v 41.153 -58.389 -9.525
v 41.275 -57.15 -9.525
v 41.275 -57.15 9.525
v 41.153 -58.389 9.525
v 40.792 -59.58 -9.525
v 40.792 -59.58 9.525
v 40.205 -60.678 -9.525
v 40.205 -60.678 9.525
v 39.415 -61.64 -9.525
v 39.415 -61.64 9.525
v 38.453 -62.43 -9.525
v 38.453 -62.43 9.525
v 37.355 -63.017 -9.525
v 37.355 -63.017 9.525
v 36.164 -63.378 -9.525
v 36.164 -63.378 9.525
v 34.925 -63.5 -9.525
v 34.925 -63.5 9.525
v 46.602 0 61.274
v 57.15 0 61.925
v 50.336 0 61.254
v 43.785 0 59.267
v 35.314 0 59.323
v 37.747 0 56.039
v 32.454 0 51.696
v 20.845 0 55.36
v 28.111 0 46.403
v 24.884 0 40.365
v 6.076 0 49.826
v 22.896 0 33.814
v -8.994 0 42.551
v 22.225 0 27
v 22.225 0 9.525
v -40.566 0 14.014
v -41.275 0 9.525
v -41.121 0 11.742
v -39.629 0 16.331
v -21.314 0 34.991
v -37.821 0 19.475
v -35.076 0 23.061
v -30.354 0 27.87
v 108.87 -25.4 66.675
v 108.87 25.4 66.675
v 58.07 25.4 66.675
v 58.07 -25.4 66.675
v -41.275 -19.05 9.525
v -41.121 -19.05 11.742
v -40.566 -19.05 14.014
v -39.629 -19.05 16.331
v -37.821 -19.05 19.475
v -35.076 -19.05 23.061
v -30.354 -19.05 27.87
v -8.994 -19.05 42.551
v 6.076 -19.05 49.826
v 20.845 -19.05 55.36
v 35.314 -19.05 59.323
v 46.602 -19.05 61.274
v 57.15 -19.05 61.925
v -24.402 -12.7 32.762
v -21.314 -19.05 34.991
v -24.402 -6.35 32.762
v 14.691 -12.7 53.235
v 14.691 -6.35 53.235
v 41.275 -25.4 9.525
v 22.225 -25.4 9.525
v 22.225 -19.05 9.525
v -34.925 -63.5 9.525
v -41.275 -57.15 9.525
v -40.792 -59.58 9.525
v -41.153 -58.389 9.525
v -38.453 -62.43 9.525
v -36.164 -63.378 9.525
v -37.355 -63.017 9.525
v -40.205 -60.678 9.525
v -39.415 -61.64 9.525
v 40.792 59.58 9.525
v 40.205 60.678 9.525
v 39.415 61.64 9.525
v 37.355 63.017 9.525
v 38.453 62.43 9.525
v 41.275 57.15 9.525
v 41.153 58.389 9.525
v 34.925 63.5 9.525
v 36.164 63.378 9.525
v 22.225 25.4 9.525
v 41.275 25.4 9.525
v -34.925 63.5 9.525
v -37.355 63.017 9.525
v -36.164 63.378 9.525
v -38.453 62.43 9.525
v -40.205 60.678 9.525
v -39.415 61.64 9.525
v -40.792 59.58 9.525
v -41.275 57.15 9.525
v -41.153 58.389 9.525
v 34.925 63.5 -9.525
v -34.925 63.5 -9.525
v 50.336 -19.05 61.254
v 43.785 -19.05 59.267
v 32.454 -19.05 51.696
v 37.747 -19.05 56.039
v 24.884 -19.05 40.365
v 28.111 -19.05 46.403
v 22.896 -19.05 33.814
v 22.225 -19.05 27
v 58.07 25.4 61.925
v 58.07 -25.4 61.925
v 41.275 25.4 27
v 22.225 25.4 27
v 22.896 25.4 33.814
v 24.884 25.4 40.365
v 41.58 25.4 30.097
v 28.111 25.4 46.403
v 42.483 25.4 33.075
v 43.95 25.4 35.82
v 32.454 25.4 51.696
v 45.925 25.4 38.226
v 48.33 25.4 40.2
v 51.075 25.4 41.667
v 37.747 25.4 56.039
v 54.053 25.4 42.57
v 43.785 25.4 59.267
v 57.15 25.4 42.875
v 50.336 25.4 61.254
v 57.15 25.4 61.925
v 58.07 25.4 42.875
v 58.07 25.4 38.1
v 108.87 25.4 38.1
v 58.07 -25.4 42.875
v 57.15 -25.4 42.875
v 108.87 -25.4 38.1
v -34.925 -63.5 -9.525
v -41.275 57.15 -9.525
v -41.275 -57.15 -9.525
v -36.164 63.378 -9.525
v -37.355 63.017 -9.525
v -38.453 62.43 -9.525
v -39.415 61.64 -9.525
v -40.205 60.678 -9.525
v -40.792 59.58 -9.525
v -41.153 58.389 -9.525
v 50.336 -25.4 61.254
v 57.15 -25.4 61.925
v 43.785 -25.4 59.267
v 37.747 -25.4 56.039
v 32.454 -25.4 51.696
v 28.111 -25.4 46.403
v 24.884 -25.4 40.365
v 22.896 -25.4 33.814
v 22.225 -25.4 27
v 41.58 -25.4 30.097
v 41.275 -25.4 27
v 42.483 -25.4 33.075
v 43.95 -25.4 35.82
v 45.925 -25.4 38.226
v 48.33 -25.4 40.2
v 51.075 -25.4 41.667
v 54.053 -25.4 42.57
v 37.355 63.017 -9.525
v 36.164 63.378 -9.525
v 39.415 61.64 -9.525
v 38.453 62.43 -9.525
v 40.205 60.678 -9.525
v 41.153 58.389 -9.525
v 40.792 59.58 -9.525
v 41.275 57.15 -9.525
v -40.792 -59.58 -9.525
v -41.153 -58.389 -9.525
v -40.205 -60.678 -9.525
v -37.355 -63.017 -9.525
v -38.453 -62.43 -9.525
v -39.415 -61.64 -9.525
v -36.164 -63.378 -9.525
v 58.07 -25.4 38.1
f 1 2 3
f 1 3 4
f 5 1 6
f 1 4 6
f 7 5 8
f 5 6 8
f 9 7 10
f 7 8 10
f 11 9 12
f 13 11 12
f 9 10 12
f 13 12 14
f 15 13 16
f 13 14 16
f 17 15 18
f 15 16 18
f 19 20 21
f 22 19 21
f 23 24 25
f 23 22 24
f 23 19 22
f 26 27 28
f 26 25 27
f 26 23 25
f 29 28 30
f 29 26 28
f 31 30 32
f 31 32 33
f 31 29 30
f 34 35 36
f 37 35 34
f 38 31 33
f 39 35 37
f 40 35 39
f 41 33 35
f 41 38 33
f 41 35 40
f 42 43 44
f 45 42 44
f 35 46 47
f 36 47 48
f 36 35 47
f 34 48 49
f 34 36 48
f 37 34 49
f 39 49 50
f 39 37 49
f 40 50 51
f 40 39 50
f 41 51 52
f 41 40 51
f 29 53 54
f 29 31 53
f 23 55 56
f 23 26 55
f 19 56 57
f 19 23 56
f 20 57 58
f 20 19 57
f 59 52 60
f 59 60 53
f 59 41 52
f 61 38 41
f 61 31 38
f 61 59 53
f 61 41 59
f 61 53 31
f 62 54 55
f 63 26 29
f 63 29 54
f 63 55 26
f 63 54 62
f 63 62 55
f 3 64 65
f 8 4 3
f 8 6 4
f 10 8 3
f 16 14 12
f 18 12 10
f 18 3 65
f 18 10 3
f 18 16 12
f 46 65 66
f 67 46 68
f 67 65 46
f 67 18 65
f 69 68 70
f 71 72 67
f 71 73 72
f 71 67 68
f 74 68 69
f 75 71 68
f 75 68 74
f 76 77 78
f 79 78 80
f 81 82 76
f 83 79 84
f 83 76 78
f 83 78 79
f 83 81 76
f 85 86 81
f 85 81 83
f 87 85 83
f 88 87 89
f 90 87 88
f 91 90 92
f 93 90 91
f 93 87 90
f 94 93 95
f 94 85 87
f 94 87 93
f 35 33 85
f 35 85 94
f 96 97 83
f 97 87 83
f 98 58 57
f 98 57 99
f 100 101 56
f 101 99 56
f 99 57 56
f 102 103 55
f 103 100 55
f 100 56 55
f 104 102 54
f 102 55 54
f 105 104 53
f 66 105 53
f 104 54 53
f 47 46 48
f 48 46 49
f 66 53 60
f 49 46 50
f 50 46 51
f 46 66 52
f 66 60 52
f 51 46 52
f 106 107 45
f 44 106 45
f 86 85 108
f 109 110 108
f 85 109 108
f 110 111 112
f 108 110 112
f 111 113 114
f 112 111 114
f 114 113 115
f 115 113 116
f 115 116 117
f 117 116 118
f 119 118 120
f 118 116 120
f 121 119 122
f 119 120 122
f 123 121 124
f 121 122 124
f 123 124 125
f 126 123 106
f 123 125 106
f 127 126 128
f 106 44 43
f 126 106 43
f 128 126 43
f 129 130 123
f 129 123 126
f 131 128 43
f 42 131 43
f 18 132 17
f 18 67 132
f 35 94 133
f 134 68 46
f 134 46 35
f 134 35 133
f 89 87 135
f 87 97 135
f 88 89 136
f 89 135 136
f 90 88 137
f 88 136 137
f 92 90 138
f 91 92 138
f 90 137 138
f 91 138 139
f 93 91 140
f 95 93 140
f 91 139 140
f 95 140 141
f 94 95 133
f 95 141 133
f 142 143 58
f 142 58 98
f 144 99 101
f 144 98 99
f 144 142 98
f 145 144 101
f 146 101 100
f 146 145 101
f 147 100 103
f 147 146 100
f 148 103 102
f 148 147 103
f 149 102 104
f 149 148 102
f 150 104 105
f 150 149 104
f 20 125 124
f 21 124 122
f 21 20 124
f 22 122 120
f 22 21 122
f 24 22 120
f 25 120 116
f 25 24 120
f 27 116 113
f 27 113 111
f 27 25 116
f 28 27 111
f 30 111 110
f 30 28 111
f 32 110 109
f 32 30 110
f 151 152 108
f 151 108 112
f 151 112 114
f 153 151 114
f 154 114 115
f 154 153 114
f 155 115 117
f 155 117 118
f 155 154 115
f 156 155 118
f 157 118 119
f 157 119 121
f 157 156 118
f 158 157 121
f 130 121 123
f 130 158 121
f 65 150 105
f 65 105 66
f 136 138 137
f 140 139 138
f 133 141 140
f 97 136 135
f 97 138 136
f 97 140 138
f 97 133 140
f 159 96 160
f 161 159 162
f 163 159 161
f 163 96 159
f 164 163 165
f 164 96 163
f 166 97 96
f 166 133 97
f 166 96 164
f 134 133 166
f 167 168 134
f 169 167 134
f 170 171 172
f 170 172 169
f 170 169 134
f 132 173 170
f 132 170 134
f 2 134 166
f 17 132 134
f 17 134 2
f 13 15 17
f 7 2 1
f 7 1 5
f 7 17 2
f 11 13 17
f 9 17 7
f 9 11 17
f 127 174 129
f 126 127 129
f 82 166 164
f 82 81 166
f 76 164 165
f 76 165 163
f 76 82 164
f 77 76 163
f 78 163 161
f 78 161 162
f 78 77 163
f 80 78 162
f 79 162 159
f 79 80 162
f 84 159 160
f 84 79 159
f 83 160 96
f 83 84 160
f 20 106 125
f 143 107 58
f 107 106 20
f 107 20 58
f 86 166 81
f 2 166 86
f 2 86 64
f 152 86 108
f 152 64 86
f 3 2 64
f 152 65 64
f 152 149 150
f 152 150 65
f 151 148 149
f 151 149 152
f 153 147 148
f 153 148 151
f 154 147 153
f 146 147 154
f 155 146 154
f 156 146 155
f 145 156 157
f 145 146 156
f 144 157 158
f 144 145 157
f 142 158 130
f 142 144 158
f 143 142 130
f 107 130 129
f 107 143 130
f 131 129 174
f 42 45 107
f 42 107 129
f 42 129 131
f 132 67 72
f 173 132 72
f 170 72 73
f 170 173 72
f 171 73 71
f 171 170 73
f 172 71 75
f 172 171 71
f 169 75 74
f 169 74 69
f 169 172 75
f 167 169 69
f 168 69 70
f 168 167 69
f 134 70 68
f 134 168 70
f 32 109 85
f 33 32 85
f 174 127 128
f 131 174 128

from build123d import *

# Parameters (mm, degrees)
F1_DEPTH = 63.5
F0_W     = 27.6548634248
F0_H     = 19.05
F0_H_2   = 4.7498
F0_H_3   = 4.7752
F2_DEPTH = 25.4
F3_DEPTH = 19.05
F4_R     = 6.35
F5_R     = 6.35


with BuildPart() as f1:
    # F0 (on Front) → F1 (new body, symmetric)
    with BuildSketch(Plane.XZ):
        Polygon((-41.275, -9.525), (41.275, -9.525), (41.275, 9.525), (22.225, 9.525), (-41.275, 9.525), align=None)
    extrude(amount=F1_DEPTH, both=True)

    # F0 (on Front) → F2 (join, symmetric)
    with BuildSketch(Plane.XZ):
        with BuildLine():
            Line((22.225, 9.525), (41.275, 9.525))
            Line((41.275, 9.525), (41.275, 27.0002))
            ThreePointArc((41.275, 27.0002), (45.9246798487, 38.2255201513), (57.15, 42.8752))
            Line((57.15, 42.8752), (58.0701365752, 42.8752))
            Line((58.0701365752, 42.8752), (58.0701365752, 61.9252))
            Line((58.0701365752, 61.9252), (57.15, 61.9252))
            ThreePointArc((57.15, 61.9252), (32.4542956671, 51.6959043329), (22.225, 27.0002))
            Line((22.225, 27.0002), (22.225, 9.525))
        make_face()
        with Locations((71.8975682876, 52.4002)):
            Rectangle(F0_W, F0_H)
        Polygon((85.725, 66.675), (85.725, 61.9252), (85.725, 42.8752), (85.725, 38.1), (108.8701365752, 38.1), (108.8701365752, 66.675), align=None)
        with Locations((71.8975682876, 64.3001)):
            Rectangle(F0_W, F0_H_2)
        with Locations((71.8975682876, 40.4876)):
            Rectangle(F0_W, F0_H_3)
    extrude(amount=F2_DEPTH, both=True)

    # F0 (on Front) → F3 (join)
    with BuildSketch(Plane.XZ):
        with BuildLine():
            add(Edge.make_bspline(
                [(-41.275, 9.525), (-41.7954027653, 31.1398338526), (19.2923080176, 62.1306672692), (57.15, 61.9252)],
                knots=[0, 0, 0, 0, 111.5045361635, 111.5045361635, 111.5045361635, 111.5045361635], degree=3))
            Line((-41.275, 9.525), (22.225, 9.525))
            Line((22.225, 9.525), (22.225, 27.0002))
            ThreePointArc((22.225, 27.0002), (32.4542956671, 51.6959043329), (57.15, 61.9252))
        make_face()
    extrude(amount=F3_DEPTH)

    # F4
    f4_edges = [f1.edges().sort_by_distance(p)[0] for p in [
        (41.275, -63.5, 0),
        (-41.275, -63.5, 0),
    ]]
    fillet(f4_edges, radius=F4_R)

    # F5
    f5_edges = [f1.edges().sort_by_distance(p)[0] for p in [
        (41.275, 63.5, 0),
        (-41.275, 63.5, 0),
    ]]
    fillet(f5_edges, radius=F5_R)


solid = f1.part
